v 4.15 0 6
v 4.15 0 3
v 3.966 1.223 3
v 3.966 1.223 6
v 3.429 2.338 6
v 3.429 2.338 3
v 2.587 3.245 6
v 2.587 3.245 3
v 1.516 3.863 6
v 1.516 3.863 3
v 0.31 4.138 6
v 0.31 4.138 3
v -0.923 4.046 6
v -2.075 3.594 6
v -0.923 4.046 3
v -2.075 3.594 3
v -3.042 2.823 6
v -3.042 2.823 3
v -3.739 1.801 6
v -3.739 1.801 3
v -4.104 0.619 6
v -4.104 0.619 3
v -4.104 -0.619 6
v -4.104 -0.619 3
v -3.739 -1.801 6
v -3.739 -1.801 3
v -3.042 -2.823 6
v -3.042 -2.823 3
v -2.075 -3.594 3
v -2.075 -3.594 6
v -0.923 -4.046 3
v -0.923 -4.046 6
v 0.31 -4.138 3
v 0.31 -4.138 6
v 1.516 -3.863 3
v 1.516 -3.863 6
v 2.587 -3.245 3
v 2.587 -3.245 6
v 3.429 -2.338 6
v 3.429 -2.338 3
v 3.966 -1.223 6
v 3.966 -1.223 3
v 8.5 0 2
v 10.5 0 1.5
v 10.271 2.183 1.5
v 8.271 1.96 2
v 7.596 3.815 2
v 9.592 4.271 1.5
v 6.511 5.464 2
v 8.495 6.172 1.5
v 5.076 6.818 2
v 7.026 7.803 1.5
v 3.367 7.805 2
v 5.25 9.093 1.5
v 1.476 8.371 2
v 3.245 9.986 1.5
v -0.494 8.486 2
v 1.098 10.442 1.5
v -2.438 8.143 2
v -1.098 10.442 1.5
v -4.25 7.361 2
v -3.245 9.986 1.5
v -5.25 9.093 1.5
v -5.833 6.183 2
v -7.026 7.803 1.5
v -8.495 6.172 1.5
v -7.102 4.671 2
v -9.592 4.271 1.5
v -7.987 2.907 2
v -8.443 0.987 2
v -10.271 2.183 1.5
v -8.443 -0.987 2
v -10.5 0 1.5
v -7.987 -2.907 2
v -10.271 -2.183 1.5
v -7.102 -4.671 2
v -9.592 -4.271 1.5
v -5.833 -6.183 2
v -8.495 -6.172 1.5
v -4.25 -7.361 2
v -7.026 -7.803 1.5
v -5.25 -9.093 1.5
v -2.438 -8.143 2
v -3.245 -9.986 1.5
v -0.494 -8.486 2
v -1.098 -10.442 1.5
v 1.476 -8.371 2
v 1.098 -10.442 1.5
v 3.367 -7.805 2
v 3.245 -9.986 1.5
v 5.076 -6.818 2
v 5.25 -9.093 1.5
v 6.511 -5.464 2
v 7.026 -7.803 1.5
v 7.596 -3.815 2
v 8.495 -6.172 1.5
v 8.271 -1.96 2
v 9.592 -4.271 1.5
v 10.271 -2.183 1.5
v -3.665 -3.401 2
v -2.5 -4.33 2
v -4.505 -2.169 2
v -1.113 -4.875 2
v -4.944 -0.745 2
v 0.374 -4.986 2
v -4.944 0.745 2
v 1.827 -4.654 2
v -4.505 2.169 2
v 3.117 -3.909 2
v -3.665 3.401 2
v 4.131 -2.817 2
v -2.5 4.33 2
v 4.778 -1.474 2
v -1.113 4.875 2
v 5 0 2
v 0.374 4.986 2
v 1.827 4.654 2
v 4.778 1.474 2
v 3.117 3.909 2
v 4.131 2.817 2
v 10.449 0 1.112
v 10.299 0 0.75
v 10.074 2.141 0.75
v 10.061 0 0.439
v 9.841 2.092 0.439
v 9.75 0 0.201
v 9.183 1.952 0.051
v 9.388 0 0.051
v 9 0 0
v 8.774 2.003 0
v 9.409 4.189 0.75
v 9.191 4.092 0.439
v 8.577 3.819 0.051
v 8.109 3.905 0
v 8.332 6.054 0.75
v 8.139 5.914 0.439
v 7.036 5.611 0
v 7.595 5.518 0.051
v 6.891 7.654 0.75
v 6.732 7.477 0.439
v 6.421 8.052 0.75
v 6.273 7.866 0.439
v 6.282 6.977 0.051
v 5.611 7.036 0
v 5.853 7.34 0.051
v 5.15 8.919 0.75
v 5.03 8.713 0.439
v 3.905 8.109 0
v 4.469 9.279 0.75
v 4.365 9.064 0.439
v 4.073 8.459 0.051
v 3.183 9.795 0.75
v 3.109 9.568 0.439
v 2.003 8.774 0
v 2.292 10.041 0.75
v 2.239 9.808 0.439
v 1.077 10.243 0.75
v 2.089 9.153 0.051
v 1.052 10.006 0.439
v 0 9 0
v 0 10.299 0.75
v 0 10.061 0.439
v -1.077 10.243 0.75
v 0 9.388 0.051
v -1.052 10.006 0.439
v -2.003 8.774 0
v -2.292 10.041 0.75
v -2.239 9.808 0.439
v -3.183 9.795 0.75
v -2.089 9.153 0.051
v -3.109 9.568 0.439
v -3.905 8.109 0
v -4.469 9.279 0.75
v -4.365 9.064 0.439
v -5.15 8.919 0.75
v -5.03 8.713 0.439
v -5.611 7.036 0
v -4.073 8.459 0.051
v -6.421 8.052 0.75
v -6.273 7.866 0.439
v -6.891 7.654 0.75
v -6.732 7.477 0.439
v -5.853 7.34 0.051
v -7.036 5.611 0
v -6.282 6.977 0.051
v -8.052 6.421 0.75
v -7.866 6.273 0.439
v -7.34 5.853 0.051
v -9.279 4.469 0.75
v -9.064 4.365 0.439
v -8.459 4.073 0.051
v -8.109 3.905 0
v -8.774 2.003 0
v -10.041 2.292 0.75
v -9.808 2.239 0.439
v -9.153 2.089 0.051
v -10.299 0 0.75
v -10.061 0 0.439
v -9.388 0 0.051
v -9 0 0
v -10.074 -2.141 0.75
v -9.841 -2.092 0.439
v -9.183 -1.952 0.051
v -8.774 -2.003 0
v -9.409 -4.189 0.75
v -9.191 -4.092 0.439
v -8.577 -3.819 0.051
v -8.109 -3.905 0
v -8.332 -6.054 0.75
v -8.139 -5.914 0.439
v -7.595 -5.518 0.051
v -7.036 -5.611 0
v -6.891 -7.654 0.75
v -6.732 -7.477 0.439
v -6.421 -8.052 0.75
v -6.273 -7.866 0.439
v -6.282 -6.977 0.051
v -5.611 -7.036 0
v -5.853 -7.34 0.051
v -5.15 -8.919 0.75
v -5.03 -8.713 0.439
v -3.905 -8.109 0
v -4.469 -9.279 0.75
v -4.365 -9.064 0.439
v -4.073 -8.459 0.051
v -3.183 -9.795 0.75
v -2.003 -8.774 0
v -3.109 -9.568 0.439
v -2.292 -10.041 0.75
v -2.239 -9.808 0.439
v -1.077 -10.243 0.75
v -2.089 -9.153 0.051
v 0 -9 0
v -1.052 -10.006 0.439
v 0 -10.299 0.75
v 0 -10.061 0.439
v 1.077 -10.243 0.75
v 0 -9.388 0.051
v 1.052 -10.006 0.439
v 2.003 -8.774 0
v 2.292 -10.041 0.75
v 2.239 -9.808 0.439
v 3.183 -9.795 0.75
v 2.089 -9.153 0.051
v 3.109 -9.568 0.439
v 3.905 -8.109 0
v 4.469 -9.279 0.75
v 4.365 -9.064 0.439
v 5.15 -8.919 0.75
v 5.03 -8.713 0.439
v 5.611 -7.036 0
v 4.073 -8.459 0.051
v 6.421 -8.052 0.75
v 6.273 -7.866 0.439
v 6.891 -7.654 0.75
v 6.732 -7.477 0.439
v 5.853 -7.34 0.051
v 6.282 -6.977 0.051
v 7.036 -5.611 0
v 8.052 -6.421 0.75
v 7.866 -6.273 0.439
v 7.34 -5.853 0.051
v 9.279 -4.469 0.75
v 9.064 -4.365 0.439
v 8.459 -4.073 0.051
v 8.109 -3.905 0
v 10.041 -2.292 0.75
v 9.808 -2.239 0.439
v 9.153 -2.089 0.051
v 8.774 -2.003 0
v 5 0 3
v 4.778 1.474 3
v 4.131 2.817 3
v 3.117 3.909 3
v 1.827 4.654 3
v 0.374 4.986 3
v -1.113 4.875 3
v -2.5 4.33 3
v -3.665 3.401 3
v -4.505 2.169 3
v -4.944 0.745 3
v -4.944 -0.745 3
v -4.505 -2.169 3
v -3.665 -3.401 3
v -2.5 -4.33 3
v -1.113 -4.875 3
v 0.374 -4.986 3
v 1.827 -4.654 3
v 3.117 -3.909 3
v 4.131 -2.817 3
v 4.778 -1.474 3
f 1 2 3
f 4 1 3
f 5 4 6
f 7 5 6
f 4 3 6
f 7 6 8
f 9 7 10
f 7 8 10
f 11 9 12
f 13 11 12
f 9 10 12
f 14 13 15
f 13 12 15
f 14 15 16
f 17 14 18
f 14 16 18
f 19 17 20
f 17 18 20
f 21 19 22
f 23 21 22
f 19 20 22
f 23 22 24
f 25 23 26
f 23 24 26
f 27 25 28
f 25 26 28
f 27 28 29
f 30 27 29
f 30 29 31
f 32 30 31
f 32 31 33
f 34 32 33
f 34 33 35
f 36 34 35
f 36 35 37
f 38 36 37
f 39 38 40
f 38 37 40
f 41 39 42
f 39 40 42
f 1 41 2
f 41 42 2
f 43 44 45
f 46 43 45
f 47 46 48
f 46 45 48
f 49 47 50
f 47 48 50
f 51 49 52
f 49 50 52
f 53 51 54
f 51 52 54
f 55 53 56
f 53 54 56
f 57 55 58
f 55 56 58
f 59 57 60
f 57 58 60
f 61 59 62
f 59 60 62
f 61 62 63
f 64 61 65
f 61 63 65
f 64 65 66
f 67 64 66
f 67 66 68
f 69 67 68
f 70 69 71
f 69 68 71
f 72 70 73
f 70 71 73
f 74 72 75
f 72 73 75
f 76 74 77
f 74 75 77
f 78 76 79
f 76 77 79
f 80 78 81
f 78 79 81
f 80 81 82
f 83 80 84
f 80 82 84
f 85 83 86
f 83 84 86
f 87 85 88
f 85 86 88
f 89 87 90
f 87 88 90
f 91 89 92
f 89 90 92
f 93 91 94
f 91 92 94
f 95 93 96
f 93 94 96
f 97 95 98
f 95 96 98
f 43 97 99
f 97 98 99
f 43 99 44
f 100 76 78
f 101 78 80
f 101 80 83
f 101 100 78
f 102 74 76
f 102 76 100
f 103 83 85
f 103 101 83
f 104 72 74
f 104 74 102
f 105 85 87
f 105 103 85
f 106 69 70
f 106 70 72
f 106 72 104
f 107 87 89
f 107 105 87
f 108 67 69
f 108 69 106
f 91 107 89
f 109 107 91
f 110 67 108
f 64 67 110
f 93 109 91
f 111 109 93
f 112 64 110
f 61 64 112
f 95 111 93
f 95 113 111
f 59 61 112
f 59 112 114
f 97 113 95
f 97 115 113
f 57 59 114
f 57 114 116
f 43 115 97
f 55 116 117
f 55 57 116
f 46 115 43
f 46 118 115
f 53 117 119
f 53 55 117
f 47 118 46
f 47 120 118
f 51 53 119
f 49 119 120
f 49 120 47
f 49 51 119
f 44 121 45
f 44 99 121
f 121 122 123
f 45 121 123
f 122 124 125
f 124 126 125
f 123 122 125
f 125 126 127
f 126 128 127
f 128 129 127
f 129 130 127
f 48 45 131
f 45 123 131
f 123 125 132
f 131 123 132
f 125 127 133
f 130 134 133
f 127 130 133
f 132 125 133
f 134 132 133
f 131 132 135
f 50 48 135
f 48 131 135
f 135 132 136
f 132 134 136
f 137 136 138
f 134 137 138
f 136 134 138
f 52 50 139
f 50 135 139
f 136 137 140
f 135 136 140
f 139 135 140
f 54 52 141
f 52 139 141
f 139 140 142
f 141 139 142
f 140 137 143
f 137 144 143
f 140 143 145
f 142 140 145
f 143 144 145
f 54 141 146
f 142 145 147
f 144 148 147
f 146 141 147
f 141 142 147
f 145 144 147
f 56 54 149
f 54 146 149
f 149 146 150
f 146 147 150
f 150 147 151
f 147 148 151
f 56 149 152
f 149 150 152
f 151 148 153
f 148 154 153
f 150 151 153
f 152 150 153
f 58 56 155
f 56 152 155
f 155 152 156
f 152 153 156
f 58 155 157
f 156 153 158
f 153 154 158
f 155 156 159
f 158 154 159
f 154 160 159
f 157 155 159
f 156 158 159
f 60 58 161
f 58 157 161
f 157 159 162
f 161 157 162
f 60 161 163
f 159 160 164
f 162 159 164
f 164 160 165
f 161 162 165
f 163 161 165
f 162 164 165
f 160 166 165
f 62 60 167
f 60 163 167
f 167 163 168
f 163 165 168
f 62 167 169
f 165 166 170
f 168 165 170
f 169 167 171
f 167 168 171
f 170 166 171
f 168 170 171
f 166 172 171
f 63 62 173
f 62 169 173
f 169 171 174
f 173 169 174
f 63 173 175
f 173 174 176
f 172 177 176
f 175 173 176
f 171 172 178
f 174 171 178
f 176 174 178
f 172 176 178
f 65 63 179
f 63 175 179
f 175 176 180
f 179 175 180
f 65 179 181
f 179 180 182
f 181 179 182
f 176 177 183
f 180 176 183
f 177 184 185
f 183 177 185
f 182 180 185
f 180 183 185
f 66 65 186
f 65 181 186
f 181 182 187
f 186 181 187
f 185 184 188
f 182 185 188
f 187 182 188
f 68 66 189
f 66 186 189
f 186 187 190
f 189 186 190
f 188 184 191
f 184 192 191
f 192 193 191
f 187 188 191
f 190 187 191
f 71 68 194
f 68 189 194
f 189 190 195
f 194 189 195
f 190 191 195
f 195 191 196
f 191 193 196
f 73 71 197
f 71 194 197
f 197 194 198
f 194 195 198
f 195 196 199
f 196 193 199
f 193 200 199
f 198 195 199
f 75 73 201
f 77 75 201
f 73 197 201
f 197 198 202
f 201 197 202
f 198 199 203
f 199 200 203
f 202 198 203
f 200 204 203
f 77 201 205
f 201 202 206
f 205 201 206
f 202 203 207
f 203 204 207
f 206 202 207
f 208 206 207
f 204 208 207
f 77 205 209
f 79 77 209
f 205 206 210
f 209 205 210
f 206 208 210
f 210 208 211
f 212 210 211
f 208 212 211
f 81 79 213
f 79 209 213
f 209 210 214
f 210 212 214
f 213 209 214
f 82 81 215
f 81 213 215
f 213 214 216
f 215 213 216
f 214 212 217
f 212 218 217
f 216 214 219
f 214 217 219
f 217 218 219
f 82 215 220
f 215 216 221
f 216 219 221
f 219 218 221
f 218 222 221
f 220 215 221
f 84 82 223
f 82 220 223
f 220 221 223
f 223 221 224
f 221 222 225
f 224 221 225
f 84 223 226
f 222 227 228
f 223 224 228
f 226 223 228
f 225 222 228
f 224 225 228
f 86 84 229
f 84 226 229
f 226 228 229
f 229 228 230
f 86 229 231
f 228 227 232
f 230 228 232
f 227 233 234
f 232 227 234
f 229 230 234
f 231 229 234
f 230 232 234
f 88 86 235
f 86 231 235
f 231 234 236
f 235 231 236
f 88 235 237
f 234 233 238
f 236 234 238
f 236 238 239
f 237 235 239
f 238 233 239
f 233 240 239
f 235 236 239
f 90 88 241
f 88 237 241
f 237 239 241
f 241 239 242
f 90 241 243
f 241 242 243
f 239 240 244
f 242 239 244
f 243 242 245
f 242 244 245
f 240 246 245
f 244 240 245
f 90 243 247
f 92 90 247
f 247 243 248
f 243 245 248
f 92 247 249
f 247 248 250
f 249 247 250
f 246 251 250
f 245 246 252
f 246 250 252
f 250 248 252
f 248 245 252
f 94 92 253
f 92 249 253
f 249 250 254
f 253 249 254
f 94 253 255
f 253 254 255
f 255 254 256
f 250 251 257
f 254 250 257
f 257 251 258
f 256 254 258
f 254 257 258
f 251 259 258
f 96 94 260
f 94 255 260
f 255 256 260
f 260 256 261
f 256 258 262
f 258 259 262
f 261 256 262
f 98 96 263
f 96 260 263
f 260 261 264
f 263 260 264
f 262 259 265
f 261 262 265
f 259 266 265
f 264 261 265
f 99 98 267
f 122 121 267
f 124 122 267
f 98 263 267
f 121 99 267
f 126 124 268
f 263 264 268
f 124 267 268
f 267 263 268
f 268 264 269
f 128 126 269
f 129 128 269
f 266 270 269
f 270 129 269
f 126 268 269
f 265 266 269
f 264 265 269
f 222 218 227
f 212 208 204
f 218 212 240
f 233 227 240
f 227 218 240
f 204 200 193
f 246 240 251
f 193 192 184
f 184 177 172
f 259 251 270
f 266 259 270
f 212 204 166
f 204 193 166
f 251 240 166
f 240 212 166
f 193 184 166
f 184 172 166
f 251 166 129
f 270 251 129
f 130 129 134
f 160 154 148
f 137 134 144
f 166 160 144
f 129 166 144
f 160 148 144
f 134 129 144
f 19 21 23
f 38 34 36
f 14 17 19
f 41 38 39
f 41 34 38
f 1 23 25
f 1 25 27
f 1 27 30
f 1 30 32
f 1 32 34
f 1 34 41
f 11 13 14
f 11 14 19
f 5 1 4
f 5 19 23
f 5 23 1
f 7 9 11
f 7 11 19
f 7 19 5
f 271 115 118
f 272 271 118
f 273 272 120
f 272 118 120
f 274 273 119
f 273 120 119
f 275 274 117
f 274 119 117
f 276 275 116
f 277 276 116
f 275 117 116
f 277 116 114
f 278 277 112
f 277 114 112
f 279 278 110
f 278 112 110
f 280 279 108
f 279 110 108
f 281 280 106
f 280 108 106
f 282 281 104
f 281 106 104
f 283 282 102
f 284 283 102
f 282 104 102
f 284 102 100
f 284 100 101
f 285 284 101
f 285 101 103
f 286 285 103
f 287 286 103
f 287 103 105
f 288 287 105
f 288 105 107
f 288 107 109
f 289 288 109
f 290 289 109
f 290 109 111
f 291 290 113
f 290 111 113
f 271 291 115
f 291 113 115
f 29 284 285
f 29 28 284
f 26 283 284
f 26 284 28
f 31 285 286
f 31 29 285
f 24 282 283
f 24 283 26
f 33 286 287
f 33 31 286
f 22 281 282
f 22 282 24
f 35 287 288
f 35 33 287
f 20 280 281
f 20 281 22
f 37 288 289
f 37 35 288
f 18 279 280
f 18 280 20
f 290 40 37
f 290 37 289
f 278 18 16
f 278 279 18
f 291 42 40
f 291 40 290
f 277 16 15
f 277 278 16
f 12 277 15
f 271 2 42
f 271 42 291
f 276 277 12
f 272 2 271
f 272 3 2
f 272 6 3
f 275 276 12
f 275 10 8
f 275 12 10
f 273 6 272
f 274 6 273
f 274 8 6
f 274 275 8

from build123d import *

# Parameters (mm, degrees)
F0_R     = 10.5
F1_DEPTH = 2
F2_R     = 5
F3_DEPTH = 1
F4_R     = 4.15
F5_DEPTH = 3
F6_SIZE2 = 0.5
F6_SIZE  = 2
F7_R     = 1.49999


# Not quite as in the source:
# - a fillet or chamfer is up to 0.001 mm smaller than in the source, because OpenCascade refuses the exact size


with BuildPart() as f1:
    # F0 (on Top) → F1 (new body)
    with BuildSketch(Plane.XY):
        Circle(F0_R)
    extrude(amount=F1_DEPTH)

    # F2 (on face) → F3 (join)
    with BuildSketch(Plane.XY.offset(2)):
        Circle(F2_R)
    extrude(amount=F3_DEPTH)

    # F4 (on face) → F5 (join)
    with BuildSketch(Plane.XY.offset(3)):
        Circle(F4_R)
    extrude(amount=F5_DEPTH)

    # F6
    f6_edges = [f1.edges().sort_by_distance(p)[0] for p in [
        (-10.5, 0, 2),
    ]]
    f6_side = f1.faces().sort_by_distance((-10.203015, 0, 2))[0]
    chamfer(f6_edges, length=F6_SIZE, length2=F6_SIZE2, reference=f6_side)

    # F7 (radius 1.5 in the source; OpenCascade refuses exactly that, so slightly less here)
    f7_edges = [f1.edges().sort_by_distance(p)[0] for p in [
        (-10.5, 0, 0),
    ]]
    fillet(f7_edges, radius=F7_R)


solid = f1.part
